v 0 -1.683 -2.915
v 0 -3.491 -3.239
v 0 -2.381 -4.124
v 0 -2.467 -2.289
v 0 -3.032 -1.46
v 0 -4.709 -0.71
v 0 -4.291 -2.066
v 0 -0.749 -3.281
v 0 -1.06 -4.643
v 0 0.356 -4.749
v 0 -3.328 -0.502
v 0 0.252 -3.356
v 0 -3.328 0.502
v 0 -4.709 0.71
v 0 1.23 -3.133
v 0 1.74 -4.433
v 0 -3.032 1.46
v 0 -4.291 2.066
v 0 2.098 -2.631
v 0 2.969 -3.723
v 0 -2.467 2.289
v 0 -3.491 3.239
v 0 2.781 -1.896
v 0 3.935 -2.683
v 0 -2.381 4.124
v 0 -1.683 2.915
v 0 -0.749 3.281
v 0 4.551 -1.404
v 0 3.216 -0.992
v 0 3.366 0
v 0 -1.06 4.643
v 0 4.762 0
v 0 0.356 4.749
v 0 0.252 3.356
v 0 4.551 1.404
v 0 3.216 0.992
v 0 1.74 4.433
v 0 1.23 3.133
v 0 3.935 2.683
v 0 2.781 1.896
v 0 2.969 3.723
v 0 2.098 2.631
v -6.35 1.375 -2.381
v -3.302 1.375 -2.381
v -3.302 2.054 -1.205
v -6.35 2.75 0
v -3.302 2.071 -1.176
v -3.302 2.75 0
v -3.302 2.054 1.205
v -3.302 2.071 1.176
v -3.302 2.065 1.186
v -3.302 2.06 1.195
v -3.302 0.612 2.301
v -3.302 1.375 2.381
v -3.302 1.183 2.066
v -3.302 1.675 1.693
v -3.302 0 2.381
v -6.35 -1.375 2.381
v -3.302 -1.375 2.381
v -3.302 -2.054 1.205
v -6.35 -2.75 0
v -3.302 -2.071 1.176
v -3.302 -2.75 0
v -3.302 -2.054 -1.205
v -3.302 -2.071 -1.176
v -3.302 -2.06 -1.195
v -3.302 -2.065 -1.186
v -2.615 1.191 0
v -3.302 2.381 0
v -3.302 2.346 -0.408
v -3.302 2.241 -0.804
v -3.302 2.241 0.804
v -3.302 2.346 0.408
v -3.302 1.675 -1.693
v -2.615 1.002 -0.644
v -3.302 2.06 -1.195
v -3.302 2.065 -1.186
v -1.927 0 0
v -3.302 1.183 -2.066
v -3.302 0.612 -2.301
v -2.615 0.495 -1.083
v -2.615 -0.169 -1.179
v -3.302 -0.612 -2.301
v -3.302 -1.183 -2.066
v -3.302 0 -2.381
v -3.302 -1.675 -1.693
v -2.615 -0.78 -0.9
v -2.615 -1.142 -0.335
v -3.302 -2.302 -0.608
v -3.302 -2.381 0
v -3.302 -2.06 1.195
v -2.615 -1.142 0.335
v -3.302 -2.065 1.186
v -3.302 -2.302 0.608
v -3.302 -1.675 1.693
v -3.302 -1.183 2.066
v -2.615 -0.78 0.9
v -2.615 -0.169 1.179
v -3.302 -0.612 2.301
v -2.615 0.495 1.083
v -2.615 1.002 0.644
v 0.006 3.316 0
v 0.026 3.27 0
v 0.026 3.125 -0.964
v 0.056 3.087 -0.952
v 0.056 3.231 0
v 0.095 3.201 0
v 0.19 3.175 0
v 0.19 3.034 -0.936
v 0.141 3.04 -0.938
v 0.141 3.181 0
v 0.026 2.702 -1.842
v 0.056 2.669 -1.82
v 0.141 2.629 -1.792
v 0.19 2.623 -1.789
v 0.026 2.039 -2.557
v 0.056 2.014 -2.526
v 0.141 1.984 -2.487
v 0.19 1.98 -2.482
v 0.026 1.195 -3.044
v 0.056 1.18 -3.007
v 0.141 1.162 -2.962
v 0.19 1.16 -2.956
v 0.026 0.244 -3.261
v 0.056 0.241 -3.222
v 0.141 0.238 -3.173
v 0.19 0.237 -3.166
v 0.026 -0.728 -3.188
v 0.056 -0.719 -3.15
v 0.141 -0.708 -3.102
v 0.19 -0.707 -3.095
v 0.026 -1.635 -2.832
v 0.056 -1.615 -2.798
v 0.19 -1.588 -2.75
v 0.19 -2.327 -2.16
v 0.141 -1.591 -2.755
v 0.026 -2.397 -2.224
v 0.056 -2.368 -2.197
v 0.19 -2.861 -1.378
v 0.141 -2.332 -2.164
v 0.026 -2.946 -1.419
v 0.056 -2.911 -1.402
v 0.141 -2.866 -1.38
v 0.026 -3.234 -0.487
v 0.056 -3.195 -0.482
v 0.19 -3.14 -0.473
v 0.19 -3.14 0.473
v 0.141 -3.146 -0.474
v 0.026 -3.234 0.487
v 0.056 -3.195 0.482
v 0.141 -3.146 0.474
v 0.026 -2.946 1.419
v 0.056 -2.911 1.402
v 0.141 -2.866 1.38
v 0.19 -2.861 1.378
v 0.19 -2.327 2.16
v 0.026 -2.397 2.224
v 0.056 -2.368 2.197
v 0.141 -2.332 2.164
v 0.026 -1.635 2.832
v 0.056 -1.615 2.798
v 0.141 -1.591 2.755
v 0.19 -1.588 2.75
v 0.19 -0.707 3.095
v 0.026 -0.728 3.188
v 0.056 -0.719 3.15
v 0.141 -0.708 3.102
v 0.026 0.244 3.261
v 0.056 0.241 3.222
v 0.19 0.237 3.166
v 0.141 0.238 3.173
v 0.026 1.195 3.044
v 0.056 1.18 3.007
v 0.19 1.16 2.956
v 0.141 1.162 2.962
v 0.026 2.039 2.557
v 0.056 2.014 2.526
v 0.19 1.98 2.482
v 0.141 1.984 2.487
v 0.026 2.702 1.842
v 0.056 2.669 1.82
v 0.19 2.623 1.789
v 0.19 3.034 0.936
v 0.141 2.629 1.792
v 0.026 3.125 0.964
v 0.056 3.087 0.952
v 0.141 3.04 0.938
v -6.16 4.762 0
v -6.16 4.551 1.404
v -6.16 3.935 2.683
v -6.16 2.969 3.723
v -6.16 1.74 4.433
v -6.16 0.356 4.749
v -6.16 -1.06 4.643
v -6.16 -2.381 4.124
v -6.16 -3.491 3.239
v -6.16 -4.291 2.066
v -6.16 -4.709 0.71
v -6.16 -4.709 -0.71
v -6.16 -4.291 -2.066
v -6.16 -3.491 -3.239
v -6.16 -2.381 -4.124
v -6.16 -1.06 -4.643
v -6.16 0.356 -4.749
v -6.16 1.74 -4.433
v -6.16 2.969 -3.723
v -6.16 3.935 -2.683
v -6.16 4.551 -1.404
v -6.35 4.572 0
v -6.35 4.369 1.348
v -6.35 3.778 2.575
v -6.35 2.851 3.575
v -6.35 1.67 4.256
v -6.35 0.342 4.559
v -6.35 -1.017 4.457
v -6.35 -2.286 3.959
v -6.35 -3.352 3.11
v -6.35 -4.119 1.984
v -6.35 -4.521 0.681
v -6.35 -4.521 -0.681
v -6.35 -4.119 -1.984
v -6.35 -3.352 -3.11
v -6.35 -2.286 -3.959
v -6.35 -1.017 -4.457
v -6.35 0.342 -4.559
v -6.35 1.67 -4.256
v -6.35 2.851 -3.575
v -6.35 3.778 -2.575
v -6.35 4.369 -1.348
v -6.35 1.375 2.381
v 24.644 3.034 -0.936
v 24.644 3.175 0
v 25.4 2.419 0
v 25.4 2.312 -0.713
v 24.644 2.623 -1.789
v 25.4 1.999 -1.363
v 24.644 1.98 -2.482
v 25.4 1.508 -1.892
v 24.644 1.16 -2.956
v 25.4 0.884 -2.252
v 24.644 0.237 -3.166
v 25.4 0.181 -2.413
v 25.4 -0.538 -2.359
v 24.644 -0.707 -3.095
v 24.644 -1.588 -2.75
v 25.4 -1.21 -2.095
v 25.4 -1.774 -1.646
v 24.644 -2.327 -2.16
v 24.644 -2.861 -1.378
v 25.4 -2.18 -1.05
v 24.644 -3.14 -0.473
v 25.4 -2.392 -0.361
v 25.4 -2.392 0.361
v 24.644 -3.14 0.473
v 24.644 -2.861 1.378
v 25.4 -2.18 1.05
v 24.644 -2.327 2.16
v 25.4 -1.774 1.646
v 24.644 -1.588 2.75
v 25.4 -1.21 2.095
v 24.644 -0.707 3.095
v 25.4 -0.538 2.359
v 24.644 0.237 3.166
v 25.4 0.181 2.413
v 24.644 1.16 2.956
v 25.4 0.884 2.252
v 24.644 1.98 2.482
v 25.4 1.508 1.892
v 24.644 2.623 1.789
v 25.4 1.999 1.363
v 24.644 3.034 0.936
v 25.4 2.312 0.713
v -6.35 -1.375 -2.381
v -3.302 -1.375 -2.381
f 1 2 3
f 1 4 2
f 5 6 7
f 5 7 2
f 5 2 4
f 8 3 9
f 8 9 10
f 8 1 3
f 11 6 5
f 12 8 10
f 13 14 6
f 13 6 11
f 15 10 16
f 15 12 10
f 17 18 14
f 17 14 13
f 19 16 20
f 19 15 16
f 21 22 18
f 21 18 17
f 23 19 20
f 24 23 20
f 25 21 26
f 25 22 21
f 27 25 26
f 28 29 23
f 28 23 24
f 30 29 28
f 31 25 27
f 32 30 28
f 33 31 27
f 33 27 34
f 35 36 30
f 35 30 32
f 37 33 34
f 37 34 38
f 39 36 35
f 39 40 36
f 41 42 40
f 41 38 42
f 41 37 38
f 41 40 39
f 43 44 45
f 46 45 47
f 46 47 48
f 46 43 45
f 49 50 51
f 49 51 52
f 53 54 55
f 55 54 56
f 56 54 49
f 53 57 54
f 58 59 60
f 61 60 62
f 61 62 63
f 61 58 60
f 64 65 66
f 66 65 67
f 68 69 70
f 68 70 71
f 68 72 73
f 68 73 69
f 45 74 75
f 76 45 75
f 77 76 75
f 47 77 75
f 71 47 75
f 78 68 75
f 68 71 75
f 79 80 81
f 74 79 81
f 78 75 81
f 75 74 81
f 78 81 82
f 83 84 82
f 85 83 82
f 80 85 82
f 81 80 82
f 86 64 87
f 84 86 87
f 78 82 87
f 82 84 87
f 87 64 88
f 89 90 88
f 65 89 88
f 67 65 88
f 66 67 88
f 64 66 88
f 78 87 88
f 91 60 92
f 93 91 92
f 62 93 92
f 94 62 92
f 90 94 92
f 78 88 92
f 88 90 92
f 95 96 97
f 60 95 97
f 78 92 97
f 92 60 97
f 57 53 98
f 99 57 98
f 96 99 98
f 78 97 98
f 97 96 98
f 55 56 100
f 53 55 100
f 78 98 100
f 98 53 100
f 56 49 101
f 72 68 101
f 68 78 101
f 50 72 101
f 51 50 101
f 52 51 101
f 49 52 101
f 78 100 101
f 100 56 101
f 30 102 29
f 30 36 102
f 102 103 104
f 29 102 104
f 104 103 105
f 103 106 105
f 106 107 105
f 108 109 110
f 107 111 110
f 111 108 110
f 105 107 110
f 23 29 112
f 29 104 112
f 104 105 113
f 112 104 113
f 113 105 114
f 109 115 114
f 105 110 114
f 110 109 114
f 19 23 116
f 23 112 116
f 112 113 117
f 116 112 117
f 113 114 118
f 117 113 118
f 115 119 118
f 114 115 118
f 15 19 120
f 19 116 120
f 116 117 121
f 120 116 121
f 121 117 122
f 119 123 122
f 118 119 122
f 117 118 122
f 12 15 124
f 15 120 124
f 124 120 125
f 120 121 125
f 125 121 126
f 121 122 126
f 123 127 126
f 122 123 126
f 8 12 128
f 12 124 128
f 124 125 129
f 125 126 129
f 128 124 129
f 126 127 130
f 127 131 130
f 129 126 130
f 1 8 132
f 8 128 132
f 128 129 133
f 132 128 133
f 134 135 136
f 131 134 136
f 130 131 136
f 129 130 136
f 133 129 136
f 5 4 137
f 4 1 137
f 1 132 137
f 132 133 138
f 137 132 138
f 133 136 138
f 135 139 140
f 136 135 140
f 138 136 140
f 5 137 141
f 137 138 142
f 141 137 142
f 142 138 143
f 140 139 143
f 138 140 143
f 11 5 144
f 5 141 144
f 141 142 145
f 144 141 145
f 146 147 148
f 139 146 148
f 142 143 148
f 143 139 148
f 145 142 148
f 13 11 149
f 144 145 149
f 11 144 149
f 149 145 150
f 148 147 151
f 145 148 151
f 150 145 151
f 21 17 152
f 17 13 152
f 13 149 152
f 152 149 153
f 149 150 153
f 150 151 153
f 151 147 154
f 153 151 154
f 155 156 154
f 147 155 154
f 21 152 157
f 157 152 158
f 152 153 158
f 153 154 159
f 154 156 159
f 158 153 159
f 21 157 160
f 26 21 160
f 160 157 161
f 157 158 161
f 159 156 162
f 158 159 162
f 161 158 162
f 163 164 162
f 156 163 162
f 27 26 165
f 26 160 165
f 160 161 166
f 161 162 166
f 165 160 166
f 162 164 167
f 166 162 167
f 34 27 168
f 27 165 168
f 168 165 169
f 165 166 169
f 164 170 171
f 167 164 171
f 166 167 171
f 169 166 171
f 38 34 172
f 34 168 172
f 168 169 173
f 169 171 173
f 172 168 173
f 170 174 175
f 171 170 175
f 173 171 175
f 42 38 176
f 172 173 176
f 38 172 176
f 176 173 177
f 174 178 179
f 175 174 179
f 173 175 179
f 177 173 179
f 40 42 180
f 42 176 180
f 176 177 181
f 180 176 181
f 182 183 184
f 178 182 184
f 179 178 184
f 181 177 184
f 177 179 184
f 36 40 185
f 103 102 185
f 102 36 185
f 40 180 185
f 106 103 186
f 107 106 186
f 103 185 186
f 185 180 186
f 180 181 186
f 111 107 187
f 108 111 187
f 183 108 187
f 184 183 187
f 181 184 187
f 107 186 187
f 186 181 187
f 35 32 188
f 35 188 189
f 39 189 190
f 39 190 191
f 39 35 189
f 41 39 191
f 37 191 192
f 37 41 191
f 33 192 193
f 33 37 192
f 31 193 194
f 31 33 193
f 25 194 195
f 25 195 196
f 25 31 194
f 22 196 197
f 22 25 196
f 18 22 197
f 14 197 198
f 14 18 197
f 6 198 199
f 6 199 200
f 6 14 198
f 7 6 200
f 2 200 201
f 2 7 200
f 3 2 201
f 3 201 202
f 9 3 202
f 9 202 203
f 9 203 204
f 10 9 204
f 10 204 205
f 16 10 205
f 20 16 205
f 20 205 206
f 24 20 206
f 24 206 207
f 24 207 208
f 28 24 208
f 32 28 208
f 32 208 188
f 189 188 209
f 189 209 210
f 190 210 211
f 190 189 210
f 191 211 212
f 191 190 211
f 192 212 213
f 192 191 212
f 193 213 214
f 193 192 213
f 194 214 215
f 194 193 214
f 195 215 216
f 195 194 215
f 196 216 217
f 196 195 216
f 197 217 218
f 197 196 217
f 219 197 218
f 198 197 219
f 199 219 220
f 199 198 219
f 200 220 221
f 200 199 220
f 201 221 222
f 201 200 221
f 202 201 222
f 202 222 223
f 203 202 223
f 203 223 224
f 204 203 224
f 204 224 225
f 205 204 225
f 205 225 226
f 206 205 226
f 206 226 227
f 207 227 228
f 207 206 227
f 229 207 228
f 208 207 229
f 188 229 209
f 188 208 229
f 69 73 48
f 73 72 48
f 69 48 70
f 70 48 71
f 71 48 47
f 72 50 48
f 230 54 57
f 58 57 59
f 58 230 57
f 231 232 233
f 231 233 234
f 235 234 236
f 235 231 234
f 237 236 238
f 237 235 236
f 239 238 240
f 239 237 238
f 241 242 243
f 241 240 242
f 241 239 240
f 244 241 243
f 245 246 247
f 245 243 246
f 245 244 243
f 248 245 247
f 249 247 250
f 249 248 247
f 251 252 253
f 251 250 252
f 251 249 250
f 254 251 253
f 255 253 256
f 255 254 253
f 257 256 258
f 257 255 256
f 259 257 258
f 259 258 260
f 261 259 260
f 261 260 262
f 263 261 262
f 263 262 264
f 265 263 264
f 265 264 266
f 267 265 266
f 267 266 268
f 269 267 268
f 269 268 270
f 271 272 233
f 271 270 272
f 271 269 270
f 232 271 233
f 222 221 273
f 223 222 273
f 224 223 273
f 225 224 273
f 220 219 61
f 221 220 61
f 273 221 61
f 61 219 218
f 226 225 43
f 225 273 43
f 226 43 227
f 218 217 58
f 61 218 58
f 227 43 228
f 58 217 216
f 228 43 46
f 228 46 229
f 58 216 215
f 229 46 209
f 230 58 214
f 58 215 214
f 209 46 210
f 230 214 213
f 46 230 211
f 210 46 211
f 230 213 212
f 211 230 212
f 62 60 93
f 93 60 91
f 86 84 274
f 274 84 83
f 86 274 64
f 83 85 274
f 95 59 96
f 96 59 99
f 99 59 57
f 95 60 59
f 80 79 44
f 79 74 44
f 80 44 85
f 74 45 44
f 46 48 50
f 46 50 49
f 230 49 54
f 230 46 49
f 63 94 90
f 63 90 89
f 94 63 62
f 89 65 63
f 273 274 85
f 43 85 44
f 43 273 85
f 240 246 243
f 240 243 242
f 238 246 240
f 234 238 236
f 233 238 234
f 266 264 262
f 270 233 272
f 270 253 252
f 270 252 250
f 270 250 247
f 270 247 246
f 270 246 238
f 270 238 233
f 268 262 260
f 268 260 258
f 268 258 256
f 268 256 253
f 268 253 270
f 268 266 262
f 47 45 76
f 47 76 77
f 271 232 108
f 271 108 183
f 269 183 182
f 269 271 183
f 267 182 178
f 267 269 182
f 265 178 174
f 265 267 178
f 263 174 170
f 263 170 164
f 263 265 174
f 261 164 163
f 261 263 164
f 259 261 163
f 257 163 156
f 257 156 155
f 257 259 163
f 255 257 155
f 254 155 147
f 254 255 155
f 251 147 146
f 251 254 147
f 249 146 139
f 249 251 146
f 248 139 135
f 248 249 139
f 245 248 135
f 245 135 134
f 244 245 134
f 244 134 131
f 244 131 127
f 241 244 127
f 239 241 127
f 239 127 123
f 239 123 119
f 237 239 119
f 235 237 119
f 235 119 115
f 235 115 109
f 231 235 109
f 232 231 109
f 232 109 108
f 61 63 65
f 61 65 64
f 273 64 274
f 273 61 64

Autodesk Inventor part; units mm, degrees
sketch "Sketch_1" plane through (0, 0, 0) normal (0, 0, 1) x (1, 0, 0)
  line L0 (25.4, 0) -> (-6.35, 0)
  line L1 (-6.35, 0) -> (-6.35, 4.572)
  line L2 (-6.35, 4.572) -> (-6.1595, 4.7625)
  line L3 (-6.1595, 4.7625) -> (0, 4.7625)
  line L4 (0, 4.7625) -> (0, 3.3655)
  arc A0 (0, 3.3655) -> (0.1905, 3.175) centre (0.1905, 3.3655) ccw
  line L5 (0.1905, 3.175) -> (24.6443, 3.175)
  line L6 (24.6443, 3.175) -> (25.4, 2.4194)
  line L7 (25.4, 2.4194) -> (25.4, 0)
  line L8 (25.4, 0) -> (-6.35, 0)
revolve "Revolution1" add sketch "Sketch_1" angle 360 about axis through (25.4, 0, 0) along (1, 0, 0)
thread "Thread1" size "1/4-20 UNC" class "2A" standard "ANSI Unified Screw Threads" length 18.2943
sketch "Sketch_3" plane through (-6.35, 0, 0) normal (1, 0, 0) x (0, 0, -1)
  line L0 (-2.3813, -1.3748) -> (0, -2.7496)
  line L1 (0, -2.7496) -> (2.3813, -1.3748)
  line L2 (2.3813, -1.3748) -> (2.3813, 1.3748)
  line L3 (2.3813, 1.3748) -> (0, 2.7496)
  line L4 (0, 2.7496) -> (-2.3813, 1.3748)
  line L5 (-2.3813, 1.3748) -> (-2.3813, -1.3748)
extrude "Extrusion1" cut sketch "Sketch_3" along normal blind 3.048
sketch "Sketch_4" plane through (0, 0, 0) normal (0, 0, 1) x (1, 0, 0)
  line L0 (-1.9272, 0) -> (-3.302, 0)
  line L1 (-3.302, 0) -> (-3.302, 2.3813)
  line L2 (-3.302, 2.3813) -> (-1.9272, 0)
  line L3 (-1.9272, 0) -> (-3.302, 0)
revolve "Revolution2" cut sketch "Sketch_4" angle 360 about axis through (-1.9272, 0, 0) along (1, 0, 0)
ref_plane "screw_XY" through (0, 0, 0) normal (1, 0, 0) x (0, 0, -1)
ref_plane "screw_YZ" through (0, 0, 0) normal (0, 0, -1) x (0, 1, 0)
ref_plane "screw_ZX" through (0, 0, 0) normal (0, 1, 0) x (1, 0, 0)
ref_plane "screw1_XY" through (25.4, 0, 0) normal (1, 0, 0) x (0, 0, -1)
ref_plane "screw1_YZ" through (25.4, 0, 0) normal (0, 0, -1) x (0, 1, 0)
ref_plane "screw1_ZX" through (25.4, 0, 0) normal (0, 1, 0) x (1, 0, 0)
ref_plane "screw2_XY" through (20.32, 0, 0) normal (1, 0, 0) x (0, 0, -1)
ref_plane "screw2_YZ" through (20.32, 0, 0) normal (0, 0, -1) x (0, 1, 0)
ref_plane "screw2_ZX" through (20.32, 0, 0) normal (0, 1, 0) x (1, 0, 0)
ref_plane "to_tnut_XY" through (7.366, 0, 0) normal (1, 0, 0) x (0, 0, -1)
ref_plane "to_tnut_YZ" through (7.366, 0, 0) normal (0, 0, -1) x (0, 1, 0)
ref_plane "to_tnut_ZX" through (7.366, 0, 0) normal (0, 1, 0) x (1, 0, 0)
properties part number "3071"
